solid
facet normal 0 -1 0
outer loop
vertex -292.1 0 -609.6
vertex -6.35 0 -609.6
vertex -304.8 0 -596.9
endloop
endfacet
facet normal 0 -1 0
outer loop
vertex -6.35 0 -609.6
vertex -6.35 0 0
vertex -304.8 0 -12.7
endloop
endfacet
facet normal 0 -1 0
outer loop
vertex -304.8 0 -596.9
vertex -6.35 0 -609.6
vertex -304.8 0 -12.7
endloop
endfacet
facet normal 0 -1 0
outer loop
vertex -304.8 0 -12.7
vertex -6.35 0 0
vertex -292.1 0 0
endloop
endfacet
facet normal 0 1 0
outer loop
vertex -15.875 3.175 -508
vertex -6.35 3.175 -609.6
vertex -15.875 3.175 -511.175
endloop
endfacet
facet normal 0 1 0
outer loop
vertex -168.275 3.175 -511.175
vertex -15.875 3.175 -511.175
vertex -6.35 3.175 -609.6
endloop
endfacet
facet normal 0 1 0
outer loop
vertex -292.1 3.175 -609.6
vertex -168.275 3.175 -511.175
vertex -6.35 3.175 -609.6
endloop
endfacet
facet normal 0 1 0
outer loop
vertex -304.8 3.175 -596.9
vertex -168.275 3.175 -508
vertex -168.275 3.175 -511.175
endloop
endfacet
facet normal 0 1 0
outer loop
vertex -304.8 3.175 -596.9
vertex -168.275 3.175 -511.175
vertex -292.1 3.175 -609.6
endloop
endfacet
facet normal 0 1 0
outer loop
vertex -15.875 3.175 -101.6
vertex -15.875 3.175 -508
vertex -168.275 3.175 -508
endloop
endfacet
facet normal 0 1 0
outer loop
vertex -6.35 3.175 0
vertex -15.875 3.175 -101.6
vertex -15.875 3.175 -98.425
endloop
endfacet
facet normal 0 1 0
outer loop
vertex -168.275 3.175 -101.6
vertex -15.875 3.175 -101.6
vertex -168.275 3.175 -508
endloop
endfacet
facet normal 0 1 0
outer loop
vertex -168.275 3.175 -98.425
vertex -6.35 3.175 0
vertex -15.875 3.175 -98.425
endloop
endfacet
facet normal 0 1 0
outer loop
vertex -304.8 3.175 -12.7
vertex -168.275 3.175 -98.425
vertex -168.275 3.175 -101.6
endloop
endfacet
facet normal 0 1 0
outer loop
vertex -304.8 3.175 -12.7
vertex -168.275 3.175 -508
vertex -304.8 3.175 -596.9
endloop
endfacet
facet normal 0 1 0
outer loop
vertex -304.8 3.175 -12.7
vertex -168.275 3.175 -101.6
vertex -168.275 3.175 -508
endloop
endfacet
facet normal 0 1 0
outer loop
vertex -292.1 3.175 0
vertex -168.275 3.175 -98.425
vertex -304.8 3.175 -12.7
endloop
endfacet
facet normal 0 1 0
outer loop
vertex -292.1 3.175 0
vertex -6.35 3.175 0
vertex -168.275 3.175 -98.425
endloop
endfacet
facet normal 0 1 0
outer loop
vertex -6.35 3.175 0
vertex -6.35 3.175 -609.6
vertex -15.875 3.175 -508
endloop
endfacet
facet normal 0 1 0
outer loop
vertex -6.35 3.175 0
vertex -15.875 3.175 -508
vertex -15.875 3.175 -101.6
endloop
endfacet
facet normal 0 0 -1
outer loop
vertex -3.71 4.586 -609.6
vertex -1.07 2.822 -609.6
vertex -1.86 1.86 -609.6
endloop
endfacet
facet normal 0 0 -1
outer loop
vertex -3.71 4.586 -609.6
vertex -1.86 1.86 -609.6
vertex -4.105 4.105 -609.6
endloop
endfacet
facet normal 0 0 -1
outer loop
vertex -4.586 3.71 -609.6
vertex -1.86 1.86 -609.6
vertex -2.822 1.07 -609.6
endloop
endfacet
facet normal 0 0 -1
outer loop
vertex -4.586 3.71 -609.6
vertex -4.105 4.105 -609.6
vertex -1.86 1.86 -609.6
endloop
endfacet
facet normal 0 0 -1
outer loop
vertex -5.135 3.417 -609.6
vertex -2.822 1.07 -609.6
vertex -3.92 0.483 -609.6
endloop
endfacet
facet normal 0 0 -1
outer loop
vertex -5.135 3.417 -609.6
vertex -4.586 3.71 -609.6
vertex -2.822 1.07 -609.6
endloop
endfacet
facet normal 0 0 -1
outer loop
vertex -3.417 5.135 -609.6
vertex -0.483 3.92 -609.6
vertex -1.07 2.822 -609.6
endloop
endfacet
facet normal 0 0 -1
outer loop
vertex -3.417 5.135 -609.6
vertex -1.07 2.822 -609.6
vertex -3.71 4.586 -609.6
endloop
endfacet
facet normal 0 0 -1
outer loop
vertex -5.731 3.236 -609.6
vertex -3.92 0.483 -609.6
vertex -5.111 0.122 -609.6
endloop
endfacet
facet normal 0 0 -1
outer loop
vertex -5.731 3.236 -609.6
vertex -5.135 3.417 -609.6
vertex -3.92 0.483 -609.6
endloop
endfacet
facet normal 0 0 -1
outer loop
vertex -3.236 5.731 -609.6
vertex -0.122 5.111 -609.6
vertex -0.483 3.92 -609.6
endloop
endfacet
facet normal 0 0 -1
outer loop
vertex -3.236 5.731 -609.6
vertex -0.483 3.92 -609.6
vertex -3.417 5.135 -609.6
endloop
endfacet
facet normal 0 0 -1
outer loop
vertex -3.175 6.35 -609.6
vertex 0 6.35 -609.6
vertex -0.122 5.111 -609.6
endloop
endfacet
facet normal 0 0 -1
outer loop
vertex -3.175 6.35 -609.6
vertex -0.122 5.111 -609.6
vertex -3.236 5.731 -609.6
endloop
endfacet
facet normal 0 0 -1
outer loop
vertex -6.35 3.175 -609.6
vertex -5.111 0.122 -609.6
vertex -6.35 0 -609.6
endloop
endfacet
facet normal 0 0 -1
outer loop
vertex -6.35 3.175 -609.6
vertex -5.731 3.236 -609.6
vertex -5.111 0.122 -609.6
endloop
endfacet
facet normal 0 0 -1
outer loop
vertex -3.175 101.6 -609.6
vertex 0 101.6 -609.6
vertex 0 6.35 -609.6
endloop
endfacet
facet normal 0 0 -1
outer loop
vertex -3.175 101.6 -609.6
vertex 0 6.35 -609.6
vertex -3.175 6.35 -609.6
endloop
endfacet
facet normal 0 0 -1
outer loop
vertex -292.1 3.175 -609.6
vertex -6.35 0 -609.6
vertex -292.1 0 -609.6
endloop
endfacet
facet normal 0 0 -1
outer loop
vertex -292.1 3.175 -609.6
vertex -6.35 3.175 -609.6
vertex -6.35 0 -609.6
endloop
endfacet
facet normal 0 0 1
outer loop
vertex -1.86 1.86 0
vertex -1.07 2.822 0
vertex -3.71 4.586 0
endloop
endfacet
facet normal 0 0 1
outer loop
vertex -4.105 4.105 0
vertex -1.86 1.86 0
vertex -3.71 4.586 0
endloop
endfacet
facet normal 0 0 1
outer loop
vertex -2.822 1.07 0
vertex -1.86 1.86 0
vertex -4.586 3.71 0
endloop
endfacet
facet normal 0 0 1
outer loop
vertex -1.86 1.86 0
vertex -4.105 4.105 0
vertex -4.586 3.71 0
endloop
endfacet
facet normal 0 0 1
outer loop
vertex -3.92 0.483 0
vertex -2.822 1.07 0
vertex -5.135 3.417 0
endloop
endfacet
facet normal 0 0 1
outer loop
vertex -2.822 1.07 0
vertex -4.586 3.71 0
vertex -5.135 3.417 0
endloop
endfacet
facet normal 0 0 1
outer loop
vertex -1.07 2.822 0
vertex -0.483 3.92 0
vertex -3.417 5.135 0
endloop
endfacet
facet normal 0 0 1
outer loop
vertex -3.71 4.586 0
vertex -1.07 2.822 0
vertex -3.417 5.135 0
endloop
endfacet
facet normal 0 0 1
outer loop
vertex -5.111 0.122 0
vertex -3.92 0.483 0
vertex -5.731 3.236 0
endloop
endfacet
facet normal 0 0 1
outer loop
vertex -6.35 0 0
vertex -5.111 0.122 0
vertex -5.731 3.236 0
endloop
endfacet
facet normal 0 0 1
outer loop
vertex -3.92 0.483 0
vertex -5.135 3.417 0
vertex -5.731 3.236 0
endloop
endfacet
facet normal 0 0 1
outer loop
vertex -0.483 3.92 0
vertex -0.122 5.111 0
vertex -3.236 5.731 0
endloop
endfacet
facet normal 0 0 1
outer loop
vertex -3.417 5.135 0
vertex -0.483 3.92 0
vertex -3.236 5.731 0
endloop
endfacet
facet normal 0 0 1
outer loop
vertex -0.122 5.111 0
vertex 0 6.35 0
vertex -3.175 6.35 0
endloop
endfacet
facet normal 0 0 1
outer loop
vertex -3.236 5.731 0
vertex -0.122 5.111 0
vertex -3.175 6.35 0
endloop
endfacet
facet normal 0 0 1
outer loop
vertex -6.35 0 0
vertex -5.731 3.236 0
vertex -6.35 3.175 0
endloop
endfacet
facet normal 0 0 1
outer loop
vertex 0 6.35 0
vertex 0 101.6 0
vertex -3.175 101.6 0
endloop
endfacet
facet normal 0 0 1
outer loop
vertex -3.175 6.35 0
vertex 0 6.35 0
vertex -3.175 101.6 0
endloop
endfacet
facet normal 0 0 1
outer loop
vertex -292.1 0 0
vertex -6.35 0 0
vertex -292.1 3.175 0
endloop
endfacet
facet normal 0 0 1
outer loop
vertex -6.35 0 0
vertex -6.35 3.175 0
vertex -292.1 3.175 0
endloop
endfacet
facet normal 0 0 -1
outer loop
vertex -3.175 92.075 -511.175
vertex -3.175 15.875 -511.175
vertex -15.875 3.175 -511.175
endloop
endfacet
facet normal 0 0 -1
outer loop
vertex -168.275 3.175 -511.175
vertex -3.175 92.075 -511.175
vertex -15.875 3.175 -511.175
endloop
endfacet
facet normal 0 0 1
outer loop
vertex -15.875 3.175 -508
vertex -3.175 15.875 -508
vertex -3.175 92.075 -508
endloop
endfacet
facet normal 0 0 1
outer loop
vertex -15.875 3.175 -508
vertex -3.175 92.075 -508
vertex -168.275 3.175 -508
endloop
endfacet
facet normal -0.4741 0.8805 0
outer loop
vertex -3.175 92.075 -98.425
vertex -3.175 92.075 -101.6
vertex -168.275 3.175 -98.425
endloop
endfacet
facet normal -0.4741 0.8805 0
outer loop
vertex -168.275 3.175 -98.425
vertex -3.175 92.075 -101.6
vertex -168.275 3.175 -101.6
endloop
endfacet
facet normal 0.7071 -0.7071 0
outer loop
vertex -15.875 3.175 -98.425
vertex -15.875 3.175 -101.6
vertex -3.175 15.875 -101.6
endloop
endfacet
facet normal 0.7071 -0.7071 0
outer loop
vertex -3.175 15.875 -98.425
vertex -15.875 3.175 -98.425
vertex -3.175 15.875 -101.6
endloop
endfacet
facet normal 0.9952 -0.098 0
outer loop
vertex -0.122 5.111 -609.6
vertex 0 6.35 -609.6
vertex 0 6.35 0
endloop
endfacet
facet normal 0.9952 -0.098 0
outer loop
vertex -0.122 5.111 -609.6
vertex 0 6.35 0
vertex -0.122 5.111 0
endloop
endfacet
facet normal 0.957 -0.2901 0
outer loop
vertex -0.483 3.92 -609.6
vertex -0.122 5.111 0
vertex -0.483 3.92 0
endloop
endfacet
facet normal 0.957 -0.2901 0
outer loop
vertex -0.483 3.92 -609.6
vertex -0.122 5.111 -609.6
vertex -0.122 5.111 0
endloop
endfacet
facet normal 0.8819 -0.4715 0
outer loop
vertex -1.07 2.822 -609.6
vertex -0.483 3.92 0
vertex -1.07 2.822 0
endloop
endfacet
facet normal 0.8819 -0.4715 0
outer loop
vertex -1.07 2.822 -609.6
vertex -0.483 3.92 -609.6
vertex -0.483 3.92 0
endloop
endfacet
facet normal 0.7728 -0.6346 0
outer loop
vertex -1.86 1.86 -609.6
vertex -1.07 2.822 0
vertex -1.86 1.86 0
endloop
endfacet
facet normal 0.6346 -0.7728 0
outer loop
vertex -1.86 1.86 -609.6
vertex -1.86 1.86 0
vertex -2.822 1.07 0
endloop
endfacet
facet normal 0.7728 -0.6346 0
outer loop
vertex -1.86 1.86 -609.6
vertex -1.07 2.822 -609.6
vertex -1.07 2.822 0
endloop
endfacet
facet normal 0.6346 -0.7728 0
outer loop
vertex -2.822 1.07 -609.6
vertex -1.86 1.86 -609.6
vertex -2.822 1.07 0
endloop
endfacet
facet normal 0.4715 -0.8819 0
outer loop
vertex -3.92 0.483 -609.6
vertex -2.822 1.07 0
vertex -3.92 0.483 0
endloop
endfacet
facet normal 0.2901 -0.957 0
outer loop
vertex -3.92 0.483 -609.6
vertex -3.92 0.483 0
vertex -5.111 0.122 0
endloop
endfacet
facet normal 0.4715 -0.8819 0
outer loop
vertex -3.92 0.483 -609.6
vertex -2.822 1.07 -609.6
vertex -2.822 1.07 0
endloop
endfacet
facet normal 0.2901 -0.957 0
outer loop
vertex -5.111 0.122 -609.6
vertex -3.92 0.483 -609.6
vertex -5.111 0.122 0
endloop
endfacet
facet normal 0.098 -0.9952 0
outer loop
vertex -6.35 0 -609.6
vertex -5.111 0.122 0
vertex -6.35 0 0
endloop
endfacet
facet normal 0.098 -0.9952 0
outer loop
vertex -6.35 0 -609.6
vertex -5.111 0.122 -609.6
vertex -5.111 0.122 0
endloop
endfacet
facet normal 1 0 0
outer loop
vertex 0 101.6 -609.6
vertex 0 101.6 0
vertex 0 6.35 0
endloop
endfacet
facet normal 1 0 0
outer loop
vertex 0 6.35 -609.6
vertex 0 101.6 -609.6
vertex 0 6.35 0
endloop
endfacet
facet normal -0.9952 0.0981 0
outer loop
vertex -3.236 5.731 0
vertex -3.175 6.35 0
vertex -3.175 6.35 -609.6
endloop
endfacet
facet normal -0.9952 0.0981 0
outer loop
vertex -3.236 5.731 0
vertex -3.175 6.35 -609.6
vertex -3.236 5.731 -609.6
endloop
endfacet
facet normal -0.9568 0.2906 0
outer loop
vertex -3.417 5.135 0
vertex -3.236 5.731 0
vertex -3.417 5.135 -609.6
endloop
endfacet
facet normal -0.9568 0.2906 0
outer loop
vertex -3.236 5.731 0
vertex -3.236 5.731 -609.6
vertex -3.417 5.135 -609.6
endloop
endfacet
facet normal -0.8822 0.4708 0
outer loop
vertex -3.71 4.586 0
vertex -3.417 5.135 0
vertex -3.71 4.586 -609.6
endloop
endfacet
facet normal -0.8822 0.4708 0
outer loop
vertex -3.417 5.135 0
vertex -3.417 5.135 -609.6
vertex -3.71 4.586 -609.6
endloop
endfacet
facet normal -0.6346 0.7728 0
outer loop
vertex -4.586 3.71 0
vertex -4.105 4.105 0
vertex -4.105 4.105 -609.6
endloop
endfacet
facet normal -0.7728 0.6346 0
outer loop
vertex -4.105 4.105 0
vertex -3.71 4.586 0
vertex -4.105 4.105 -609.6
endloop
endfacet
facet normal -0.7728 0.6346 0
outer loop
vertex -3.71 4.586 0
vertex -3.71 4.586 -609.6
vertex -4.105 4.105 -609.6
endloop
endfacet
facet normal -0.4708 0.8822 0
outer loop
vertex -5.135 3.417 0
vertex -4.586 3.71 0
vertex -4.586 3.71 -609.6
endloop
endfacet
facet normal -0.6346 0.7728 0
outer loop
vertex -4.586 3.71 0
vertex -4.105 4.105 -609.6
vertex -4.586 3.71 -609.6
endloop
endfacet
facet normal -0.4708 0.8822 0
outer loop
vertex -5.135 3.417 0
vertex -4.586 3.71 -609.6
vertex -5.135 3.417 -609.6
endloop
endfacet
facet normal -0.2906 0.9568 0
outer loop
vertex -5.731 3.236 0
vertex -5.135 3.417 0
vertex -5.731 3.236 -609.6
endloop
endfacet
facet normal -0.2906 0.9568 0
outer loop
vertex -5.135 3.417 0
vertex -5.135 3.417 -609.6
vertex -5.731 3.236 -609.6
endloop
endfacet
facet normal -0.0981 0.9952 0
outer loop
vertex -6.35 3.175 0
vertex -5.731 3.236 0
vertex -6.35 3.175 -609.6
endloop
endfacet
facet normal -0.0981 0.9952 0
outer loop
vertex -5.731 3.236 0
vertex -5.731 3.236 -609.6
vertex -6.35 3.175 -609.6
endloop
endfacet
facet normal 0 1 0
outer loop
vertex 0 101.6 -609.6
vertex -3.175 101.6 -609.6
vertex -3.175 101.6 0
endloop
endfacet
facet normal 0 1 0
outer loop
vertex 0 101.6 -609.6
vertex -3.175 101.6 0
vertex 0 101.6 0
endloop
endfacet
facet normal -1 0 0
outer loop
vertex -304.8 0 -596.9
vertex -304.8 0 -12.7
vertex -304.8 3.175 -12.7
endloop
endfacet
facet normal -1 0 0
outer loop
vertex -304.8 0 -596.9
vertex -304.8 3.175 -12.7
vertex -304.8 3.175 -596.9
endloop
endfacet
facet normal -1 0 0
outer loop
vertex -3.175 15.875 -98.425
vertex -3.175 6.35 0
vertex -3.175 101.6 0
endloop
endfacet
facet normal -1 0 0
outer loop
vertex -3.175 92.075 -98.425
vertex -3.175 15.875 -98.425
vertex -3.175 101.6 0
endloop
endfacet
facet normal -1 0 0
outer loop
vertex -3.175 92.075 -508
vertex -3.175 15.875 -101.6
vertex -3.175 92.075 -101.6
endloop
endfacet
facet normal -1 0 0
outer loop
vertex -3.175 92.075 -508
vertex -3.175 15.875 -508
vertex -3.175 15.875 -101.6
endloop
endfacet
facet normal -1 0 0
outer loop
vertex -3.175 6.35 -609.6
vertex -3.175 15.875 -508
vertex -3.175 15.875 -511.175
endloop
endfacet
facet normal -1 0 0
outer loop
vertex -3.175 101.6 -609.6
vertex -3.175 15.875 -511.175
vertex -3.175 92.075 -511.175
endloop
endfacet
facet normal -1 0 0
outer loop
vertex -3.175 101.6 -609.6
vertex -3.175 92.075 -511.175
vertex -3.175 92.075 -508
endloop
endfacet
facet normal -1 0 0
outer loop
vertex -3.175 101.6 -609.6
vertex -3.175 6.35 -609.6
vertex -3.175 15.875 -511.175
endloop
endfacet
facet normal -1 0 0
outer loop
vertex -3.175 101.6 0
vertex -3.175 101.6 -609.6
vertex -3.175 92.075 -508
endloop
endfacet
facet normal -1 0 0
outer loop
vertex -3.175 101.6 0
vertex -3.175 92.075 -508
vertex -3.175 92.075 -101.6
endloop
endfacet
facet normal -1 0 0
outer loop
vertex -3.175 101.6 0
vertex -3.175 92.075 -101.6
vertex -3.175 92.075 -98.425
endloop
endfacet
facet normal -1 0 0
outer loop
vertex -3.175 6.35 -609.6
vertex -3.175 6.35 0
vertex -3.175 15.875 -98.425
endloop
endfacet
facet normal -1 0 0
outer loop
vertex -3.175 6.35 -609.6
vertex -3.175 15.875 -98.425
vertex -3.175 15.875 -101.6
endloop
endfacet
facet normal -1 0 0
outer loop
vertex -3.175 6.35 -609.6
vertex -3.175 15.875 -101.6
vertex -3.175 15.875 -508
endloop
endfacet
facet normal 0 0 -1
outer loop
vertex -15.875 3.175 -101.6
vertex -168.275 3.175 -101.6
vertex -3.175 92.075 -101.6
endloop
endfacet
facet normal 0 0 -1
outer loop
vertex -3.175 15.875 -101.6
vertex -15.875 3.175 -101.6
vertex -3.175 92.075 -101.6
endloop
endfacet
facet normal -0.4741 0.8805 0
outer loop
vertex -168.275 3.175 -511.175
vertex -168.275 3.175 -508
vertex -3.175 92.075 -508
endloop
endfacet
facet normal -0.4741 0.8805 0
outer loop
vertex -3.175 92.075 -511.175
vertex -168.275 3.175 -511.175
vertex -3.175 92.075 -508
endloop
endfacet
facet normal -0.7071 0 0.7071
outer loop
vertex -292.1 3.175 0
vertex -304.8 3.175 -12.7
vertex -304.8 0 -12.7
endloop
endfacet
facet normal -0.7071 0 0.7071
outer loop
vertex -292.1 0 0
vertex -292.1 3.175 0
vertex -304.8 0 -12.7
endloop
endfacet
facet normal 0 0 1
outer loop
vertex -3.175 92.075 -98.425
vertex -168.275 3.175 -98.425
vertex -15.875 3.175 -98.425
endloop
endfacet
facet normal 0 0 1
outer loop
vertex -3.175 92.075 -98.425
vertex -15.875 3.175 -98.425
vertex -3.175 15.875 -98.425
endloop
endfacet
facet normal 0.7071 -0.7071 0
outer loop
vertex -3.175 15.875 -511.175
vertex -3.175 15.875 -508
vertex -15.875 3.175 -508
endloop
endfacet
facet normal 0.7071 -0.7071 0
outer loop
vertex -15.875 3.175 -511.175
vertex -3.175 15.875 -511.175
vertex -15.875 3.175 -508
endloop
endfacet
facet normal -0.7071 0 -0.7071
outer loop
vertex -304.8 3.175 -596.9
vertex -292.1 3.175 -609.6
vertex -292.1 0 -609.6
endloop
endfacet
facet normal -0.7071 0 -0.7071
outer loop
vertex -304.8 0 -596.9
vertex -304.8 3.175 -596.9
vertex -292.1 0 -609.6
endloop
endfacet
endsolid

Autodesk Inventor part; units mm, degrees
ref_plane "YZ Plane" through (0, 0, 0) normal (1, 0, 0) x (0, 1, 0)
ref_plane "XZ Plane" through (0, 0, 0) normal (0, 1, 0) x (-1, 0, 0)
ref_plane "XY Plane" through (0, 0, 0) normal (0, 0, 1) x (1, 0, 0)
sketch "Sketch1" plane through (0, 0, 0) normal (0, 1, 0) x (-1, 0, 0)
  line L0 (0, 0) -> (304.8, 0)
  line L1 (304.8, 0) -> (304.8, -609.6)
  line L2 (304.8, -609.6) -> (0, -609.6)
  line L3 (0, -609.6) -> (0, 0)
  dimension "d0" = 609.6
  dimension "d1" = 304.8
extrude "Plate1" add sketch "Sketch1" along normal blind 3.175
sketch "Sketch2" plane through (-3.175, 0, -609.6) normal (1, 0, 0) x (0, 1, 0)
  line L0 (0, 609.6) -> (0, 0)
  line L1 (0, 0) -> (101.6, 0)
  line L2 (101.6, 0) -> (101.6, 609.6)
  line L3 (101.6, 609.6) -> (0, 609.6)
edge flange "Flange1" height 101.6 angle 90 thickness 3.175 bend radius 3.175 thickness toward (1, 0, 0) relief tear relief width 3.175 relief depth 1.5875 edges at (0, 3.175, -304.8) wall of the first edge with corners at (-3.175, 0, 0) (-3.175, 0, -609.6) (-3.175, 101.6, -609.6) (-3.175, 101.6, 0)
bend "Bend1"
corner "Corner1"
chamfer "Chamfer1" distance 12.7 angle 45 2 edges at (-304.8, 1.5875, -609.6) (-304.8, 1.5875, 0)
ref_plane "Work Plane1" through (-6.35, 0, -508) normal (0, 0, -1) x (-1, 0, 0)
sketch "Sketch3" plane through (-6.35, 0, -508) normal (0, 0, -1) x (-1, 0, 0)
  line L0 (-3.175, 6.35) -> (-3.175, 101.6)
  line L1 (-3.175, 15.875) -> (9.525, 3.175)
  line L2 (285.75, 3.175) -> (0, 3.175)
  line L3 (161.925, 3.175) -> (-3.175, 92.075)
  line L4 (-3.175, 92.075) -> (-3.175, 15.875)
  line L5 (9.525, 3.175) -> (161.925, 3.175)
  point P0 (-6.35, 0)
  dimension "d17" = 152.4
  dimension "d18" = 76.2
  dimension "d19" = 12.7
  dimension "d20" = 135
sheet face with bend "Face2" sketch "Sketch3" thickness 3.175 toward (0, 0, -1) bend radius 3.175
bend "Bend2"
ref_plane "Work Plane2" through (-6.35, 0, -304.8) normal (0, 0, -1) x (-1, 0, 0)
mirror "Mirror1" about plane through (-6.35, 0, -304.8) normal (0, 0, -1)
equation "\"d2\" = Thickness"
equation "\"d3\" = BendReliefWidth"
equation "\"d4\" = BendReliefDepth"
equation "\"d5\" = MinimumRemnant"
equation "\"d6\" = TransitionRadius"
equation "\"d9\" = BendRadius"
equation "\"d10\" = CornerReliefSize"
equation "\"d11\" = GapSize"
equation "\"d12\" = JacobiRadiusSize"
equation "\"d21\" = BendRadius"
equation "\"d22\" = BendReliefWidth"
equation "\"d24\" = MinimumRemnant"
equation "\"d23\" = BendReliefDepth"
equation "\"d25\" = TransitionRadius"
equation "\"BendRadius\" = Thickness"
equation "\"BendReliefWidth\" = Thickness"
equation "\"BendReliefDepth\" = 0.5 * Thickness"
equation "\"CornerReliefSize\" = 4 * Thickness"
equation "\"MinimumRemnant\" = 2 * Thickness"
equation "\"TransitionRadius\" = BendRadius"
equation "\"JacobiRadiusSize\" = BendRadius"
equation "\"GapSize\" = Thickness"
equation "\"Thickness\" = 3.175"
properties part number "21015-22-1-6- Work Shelves" material "Steel, Carbon"
